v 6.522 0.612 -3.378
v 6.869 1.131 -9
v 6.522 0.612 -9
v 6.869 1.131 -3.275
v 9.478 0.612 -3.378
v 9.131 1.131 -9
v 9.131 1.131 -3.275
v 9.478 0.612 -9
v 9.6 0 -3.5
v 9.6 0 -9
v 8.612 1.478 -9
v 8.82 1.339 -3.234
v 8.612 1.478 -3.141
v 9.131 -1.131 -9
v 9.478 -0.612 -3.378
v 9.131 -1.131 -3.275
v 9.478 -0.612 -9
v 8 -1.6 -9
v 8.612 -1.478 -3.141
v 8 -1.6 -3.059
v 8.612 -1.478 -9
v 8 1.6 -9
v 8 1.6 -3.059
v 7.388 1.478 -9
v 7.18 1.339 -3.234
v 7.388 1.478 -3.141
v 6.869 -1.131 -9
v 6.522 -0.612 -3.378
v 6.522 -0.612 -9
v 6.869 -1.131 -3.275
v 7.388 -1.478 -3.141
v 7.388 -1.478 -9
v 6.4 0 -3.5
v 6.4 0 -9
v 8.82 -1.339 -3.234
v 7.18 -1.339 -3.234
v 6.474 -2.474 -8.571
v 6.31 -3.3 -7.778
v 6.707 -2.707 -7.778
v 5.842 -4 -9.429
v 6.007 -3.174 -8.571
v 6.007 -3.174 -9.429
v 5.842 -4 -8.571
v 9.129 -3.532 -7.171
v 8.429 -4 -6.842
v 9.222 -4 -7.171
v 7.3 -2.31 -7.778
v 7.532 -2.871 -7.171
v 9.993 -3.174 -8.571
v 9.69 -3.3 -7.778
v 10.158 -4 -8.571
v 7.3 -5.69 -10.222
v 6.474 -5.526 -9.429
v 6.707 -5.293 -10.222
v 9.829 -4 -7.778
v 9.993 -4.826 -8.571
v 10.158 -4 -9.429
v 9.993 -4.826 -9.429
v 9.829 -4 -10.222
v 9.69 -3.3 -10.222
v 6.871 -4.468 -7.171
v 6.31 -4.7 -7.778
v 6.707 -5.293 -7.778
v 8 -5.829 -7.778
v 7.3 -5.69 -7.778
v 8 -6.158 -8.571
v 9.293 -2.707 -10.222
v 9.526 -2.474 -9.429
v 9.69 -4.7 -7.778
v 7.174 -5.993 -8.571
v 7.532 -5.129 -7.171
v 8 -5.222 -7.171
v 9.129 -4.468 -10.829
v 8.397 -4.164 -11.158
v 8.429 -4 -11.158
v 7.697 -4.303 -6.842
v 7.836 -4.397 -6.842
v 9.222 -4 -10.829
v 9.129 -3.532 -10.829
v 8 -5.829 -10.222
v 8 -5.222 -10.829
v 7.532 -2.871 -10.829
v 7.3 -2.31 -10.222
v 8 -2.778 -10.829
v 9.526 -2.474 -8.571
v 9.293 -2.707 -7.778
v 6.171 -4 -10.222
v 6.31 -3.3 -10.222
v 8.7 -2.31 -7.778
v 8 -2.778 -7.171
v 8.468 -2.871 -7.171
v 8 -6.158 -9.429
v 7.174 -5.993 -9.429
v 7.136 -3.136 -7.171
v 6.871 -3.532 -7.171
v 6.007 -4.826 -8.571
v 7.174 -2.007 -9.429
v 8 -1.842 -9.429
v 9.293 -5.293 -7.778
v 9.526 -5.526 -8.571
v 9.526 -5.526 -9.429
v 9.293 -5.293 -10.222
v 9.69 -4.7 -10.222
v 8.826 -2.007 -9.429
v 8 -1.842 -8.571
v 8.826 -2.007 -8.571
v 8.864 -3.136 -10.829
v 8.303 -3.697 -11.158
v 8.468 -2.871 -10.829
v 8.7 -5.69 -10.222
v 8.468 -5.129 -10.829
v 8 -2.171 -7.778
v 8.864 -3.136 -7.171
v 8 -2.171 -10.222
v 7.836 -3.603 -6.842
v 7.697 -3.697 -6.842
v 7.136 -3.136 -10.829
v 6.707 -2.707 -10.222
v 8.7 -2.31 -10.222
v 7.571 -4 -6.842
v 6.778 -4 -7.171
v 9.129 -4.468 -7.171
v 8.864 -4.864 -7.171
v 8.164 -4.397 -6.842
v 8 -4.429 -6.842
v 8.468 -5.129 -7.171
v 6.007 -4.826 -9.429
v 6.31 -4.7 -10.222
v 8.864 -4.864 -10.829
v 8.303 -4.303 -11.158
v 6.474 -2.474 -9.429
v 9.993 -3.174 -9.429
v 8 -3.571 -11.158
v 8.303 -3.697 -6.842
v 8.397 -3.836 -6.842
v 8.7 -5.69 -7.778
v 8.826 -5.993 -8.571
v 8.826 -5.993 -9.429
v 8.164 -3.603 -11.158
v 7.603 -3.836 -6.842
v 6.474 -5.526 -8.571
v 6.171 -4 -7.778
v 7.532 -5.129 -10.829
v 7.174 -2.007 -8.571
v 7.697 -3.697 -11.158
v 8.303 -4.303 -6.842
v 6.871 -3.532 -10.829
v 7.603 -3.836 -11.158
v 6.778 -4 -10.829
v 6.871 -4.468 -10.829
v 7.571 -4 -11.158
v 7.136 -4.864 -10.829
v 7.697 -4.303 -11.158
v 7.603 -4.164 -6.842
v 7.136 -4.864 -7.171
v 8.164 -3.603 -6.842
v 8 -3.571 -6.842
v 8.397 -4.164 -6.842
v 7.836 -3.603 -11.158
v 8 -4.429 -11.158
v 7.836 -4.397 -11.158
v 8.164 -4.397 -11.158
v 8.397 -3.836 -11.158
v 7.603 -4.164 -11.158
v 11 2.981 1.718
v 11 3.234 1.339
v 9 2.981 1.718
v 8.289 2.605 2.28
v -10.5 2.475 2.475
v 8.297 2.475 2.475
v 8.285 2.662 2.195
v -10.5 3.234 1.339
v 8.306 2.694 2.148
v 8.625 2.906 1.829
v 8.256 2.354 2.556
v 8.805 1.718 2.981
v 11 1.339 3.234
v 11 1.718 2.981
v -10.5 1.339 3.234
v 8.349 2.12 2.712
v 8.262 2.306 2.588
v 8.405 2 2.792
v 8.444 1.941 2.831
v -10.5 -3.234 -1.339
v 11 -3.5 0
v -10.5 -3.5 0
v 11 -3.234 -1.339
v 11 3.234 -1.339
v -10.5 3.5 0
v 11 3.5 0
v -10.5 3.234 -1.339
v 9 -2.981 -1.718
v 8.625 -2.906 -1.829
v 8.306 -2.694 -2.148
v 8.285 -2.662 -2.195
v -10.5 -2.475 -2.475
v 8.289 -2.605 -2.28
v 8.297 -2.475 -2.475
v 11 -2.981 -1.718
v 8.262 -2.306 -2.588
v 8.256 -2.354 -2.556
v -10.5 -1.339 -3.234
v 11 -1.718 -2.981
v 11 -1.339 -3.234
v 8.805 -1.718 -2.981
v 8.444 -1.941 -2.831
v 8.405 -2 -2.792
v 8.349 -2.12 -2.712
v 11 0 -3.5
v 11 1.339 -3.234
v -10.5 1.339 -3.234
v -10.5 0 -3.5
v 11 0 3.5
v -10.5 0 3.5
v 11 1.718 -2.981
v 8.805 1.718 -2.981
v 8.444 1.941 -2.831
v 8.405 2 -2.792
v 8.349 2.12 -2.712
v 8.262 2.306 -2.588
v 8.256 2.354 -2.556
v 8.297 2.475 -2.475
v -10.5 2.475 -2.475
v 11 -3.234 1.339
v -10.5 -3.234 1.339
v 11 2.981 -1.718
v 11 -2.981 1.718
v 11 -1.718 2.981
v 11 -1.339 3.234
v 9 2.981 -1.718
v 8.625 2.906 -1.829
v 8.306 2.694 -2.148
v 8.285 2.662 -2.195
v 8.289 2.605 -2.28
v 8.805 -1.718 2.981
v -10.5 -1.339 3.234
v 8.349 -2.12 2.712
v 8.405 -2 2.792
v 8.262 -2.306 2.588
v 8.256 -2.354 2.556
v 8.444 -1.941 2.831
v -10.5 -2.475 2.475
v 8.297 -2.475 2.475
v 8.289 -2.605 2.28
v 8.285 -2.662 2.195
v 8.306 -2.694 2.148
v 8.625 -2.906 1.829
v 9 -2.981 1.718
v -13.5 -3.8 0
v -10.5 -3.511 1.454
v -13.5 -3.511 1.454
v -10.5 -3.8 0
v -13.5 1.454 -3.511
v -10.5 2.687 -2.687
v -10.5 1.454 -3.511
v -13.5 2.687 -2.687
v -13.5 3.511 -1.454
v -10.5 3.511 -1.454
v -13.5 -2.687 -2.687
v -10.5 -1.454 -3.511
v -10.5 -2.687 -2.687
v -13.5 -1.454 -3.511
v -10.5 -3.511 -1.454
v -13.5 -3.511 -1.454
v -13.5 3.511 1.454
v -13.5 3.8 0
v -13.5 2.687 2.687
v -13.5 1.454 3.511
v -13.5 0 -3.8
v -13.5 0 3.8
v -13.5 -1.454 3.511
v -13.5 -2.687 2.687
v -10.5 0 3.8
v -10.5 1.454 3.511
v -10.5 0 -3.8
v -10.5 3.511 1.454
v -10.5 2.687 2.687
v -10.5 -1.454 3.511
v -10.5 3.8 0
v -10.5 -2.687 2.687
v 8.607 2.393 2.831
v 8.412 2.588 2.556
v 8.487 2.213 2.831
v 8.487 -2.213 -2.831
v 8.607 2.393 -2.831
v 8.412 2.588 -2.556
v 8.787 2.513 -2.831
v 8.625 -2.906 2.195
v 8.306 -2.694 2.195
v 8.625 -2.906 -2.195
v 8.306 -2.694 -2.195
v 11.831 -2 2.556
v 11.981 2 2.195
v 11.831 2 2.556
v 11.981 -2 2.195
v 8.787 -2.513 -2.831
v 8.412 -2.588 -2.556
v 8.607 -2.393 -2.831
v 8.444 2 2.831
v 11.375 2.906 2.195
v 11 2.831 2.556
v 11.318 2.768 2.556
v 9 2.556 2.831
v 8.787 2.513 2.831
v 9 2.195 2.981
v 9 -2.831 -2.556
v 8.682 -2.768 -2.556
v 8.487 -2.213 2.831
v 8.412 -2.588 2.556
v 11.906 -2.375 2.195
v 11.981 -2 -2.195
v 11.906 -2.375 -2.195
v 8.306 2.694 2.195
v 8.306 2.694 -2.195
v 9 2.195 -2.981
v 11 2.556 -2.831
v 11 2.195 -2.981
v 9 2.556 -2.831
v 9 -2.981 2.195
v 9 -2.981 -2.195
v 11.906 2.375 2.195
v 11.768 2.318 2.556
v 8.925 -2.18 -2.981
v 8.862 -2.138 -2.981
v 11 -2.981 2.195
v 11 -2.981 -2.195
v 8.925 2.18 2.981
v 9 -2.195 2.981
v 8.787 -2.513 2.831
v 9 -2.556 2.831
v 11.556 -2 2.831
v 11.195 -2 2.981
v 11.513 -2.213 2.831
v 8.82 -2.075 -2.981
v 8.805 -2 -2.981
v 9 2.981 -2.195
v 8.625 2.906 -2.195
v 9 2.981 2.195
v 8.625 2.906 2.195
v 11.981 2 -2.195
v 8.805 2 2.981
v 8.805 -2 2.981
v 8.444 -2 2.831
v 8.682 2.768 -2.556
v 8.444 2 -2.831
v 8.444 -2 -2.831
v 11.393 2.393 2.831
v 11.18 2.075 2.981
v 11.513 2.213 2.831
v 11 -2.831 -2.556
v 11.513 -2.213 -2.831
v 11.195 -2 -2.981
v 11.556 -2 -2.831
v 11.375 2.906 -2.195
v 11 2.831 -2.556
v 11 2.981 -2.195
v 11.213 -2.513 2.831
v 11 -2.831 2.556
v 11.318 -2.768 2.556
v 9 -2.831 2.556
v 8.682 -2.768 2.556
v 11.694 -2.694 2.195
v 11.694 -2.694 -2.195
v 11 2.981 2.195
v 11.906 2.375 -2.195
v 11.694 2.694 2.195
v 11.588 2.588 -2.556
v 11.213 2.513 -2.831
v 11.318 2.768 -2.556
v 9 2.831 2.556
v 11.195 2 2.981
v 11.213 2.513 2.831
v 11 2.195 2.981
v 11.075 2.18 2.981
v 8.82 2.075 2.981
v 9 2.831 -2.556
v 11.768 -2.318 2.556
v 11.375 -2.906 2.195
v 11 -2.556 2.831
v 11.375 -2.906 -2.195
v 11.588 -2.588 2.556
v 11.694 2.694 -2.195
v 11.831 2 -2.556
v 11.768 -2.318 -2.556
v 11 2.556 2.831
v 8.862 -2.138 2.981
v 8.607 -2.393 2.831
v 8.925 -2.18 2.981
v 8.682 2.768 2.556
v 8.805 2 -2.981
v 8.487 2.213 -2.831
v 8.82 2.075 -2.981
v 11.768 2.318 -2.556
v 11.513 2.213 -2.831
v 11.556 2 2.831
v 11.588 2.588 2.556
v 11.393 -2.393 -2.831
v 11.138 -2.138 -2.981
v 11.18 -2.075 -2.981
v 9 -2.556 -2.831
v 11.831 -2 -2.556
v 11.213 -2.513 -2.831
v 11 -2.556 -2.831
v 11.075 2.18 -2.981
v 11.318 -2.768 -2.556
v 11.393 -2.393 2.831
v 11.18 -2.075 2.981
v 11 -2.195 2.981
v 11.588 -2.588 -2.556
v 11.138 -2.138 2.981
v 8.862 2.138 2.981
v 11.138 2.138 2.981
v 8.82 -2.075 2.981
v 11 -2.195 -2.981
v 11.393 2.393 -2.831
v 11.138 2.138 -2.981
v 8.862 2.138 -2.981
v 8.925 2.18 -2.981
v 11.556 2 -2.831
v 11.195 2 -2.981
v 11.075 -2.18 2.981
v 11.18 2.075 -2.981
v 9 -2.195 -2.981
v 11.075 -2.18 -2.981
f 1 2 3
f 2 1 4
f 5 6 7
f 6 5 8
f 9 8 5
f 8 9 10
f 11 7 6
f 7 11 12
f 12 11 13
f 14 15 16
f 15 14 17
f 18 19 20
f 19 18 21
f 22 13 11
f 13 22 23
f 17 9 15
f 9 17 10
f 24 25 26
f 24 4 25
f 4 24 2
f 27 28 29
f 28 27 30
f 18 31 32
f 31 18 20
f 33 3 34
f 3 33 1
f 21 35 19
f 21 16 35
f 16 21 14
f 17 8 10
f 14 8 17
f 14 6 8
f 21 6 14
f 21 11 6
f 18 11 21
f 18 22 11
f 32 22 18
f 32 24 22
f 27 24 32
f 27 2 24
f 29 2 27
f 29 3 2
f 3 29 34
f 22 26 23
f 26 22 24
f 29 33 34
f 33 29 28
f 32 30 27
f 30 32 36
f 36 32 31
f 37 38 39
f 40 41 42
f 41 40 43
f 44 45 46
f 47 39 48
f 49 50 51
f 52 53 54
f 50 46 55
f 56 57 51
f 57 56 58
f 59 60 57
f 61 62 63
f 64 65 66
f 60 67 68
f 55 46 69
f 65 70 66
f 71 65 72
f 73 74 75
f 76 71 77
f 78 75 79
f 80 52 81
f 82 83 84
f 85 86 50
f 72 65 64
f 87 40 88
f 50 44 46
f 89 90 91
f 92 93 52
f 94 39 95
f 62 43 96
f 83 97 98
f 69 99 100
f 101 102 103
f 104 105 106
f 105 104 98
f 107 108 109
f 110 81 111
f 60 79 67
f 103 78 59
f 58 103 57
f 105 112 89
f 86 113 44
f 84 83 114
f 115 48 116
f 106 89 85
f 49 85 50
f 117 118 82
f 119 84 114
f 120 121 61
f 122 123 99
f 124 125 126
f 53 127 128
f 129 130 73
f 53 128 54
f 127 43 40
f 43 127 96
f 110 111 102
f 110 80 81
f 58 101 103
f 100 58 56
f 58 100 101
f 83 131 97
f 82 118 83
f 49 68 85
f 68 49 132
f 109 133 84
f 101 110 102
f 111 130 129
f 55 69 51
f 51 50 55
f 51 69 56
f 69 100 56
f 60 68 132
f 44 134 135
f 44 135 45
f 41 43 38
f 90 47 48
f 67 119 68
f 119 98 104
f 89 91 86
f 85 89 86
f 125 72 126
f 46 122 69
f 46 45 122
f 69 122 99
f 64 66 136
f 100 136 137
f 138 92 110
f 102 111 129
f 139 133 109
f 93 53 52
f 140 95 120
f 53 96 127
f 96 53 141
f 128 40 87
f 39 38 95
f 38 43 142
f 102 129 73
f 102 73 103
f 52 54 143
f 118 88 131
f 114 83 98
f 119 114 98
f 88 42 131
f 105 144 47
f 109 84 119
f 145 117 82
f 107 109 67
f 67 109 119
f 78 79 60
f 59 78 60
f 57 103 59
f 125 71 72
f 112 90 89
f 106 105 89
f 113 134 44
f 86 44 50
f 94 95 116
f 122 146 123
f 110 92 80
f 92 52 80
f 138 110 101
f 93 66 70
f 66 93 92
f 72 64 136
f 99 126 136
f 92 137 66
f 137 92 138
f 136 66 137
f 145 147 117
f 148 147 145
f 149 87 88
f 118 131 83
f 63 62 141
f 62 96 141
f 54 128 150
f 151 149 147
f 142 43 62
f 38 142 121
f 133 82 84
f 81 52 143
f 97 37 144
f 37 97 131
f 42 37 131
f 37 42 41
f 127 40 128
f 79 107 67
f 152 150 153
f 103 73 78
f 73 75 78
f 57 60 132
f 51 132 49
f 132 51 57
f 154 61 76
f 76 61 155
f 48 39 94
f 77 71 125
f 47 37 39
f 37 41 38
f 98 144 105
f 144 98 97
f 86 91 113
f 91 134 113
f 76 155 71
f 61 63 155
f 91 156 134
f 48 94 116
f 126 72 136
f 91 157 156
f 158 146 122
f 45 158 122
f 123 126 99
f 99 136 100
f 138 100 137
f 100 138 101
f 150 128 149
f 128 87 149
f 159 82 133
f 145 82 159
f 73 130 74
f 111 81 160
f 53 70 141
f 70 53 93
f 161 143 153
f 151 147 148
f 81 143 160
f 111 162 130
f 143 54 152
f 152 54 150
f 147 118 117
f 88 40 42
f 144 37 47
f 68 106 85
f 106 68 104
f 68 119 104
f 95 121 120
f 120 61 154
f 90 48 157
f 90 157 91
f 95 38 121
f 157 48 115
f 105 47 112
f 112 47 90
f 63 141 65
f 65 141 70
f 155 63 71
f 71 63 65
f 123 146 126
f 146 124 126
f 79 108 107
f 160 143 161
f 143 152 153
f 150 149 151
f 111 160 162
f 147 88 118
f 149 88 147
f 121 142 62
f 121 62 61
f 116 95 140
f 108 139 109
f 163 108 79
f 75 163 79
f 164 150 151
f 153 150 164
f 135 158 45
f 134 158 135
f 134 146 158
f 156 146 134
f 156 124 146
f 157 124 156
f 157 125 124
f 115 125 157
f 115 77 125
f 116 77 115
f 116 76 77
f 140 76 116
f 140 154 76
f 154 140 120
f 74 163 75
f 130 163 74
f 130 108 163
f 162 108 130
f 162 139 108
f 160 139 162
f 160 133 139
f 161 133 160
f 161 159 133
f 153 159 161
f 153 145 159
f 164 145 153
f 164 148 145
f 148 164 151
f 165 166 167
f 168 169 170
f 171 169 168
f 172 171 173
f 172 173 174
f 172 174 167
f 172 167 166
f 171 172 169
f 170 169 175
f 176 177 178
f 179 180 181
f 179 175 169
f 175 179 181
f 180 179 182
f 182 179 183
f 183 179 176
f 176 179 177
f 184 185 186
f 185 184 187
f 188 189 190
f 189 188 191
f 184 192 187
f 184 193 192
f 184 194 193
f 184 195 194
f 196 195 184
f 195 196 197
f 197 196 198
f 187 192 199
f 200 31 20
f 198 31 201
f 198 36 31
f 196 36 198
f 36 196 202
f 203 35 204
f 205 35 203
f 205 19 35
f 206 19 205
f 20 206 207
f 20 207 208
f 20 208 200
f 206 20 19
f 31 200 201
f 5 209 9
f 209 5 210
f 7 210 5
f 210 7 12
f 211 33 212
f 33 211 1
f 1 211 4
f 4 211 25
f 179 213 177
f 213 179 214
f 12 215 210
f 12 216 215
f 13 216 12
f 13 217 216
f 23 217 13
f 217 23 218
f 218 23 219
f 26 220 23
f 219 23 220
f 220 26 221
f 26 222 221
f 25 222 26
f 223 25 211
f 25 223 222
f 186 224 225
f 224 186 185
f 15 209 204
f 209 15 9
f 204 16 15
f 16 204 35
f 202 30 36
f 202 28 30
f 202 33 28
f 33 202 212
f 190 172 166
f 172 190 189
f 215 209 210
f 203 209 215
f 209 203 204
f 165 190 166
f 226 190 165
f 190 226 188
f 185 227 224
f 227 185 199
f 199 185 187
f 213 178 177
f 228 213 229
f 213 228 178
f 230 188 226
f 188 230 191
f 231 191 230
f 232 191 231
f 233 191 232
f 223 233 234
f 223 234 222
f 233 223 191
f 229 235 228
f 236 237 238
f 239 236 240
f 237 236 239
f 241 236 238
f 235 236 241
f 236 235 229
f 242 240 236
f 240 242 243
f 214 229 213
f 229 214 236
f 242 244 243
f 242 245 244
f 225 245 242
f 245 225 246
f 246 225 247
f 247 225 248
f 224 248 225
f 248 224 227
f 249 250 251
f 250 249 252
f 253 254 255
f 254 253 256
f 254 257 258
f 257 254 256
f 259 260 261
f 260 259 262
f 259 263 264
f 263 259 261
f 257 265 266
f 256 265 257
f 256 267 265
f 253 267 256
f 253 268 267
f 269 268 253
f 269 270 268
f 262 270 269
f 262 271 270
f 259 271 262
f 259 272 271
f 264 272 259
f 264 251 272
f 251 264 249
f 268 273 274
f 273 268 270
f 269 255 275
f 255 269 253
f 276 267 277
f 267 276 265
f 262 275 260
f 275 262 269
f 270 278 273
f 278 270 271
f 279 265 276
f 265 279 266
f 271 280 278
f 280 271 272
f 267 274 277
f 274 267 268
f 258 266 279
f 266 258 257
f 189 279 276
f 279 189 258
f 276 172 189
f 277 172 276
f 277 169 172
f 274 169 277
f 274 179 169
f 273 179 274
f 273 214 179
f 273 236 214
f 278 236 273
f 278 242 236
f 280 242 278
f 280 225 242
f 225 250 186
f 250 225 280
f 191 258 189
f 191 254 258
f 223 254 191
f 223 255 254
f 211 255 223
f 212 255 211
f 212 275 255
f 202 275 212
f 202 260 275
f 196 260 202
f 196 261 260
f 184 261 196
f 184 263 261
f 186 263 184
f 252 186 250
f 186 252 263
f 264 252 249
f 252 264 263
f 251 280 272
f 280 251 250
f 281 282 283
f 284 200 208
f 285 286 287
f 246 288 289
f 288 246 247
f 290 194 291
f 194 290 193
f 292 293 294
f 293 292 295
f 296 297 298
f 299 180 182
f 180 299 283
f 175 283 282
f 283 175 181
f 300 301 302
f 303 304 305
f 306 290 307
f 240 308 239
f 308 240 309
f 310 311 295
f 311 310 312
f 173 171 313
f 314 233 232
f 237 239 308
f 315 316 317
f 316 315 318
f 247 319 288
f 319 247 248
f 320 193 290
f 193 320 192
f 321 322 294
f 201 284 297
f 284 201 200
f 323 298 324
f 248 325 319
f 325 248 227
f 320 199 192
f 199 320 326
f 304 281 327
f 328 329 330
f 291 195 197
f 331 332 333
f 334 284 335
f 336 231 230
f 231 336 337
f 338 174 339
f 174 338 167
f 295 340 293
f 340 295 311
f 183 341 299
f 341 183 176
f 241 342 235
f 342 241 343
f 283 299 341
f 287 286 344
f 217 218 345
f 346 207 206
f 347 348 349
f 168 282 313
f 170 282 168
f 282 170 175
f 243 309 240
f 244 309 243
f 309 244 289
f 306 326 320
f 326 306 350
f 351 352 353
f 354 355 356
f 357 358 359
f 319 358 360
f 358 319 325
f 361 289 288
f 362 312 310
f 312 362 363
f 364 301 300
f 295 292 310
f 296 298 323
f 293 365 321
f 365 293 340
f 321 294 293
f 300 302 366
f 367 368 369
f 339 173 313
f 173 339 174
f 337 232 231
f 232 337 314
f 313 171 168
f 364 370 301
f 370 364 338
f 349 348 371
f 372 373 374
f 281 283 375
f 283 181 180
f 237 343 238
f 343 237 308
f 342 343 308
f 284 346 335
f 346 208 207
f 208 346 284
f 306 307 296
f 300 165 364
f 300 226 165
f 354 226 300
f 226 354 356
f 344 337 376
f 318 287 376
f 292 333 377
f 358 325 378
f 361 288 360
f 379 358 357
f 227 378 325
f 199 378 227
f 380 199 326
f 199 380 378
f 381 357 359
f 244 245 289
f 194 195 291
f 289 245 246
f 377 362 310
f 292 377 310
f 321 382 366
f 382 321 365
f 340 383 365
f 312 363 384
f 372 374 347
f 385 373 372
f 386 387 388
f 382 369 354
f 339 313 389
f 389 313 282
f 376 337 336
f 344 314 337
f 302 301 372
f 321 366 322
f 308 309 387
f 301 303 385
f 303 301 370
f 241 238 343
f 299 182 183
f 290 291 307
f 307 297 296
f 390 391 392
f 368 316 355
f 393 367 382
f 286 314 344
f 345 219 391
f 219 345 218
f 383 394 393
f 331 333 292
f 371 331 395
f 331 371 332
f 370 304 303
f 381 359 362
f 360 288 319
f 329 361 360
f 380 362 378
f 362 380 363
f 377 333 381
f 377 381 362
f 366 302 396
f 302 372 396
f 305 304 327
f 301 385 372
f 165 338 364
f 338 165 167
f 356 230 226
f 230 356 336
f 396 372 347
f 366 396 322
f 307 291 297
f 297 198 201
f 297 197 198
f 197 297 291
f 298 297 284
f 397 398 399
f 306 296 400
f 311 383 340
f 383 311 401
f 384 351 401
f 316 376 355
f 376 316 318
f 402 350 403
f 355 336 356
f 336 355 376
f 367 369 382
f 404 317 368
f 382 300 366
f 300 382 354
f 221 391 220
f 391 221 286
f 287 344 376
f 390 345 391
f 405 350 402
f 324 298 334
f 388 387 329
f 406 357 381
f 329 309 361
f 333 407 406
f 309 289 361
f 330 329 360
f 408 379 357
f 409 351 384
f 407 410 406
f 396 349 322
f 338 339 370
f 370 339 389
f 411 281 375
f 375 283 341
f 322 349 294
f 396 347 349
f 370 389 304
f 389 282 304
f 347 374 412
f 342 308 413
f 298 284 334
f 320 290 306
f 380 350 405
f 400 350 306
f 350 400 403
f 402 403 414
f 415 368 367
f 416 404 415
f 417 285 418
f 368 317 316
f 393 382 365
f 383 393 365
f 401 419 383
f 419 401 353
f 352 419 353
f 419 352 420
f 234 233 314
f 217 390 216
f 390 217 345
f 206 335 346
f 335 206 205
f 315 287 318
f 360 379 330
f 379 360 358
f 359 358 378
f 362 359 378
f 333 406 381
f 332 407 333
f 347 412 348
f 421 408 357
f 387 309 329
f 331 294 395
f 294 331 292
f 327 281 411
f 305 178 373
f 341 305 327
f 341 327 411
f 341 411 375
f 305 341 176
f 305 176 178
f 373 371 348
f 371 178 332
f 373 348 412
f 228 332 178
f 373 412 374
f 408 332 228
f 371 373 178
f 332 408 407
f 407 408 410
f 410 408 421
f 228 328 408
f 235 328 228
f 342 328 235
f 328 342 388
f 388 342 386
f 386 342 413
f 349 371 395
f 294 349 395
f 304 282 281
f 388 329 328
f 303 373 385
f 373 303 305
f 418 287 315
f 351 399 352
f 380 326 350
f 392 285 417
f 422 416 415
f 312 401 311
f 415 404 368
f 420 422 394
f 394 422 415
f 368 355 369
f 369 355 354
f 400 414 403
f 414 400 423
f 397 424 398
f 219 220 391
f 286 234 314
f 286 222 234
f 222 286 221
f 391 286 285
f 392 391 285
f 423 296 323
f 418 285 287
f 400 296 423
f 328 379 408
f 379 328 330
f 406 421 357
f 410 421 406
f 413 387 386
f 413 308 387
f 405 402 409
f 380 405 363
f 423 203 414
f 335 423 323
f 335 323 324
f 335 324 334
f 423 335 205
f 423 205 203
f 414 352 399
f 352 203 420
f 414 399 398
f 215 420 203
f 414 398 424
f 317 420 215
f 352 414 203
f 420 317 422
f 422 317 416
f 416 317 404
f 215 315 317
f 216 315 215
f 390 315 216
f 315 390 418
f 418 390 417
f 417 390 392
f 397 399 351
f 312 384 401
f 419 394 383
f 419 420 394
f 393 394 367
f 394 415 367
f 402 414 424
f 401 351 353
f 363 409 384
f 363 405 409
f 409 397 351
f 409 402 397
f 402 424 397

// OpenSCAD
// 狙击枪旋转后拉式枪机 bolt（独立枪栓）— 精细版 v2
// 默认位于机匣后部，沿 -X 拖动即后拉（旋转后拉式）
$fn = 16;

module rbox(x,y,z,r=1.2){
  hull(){
    translate([-x/2+r,-y/2+r,-z/2+r]) sphere(r);
    translate([ x/2-r,-y/2+r,-z/2+r]) sphere(r);
    translate([-x/2+r, y/2-r,-z/2+r]) sphere(r);
    translate([ x/2-r, y/2-r,-z/2+r]) sphere(r);
    translate([-x/2+r,-y/2+r, z/2-r]) sphere(r);
    translate([ x/2-r,-y/2+r, z/2-r]) sphere(r);
    translate([-x/2+r, y/2-r, z/2-r]) sphere(r);
    translate([ x/2-r, y/2-r, z/2-r]) sphere(r);
  }
}

COL       = "#5b616b";
COL_DARK  = "#0f1114";

// 枪机主体（圆柱）
color(COL) rotate([0,90,0]) cylinder(h=22,r=3.5,center=true);

// 机柄 bolt handle：L 形弯折（向下再出球柄）
color(COL_DARK){
  translate([6,0,0]) rotate([0,90,0]) cylinder(h=4,r=2,center=true);
  translate([8,0,-4]) cylinder(h=10,r=1.6,center=true);
  translate([8,-4,-9]) sphere(2.2);
}
// 枪机头
color(COL) translate([-12,0,0]) rotate([0,90,0]) cylinder(h=3,r=3.8,center=true);
// 机柄座
color(COL_DARK) translate([10,0,0]) rbox(4,6,6,1);
